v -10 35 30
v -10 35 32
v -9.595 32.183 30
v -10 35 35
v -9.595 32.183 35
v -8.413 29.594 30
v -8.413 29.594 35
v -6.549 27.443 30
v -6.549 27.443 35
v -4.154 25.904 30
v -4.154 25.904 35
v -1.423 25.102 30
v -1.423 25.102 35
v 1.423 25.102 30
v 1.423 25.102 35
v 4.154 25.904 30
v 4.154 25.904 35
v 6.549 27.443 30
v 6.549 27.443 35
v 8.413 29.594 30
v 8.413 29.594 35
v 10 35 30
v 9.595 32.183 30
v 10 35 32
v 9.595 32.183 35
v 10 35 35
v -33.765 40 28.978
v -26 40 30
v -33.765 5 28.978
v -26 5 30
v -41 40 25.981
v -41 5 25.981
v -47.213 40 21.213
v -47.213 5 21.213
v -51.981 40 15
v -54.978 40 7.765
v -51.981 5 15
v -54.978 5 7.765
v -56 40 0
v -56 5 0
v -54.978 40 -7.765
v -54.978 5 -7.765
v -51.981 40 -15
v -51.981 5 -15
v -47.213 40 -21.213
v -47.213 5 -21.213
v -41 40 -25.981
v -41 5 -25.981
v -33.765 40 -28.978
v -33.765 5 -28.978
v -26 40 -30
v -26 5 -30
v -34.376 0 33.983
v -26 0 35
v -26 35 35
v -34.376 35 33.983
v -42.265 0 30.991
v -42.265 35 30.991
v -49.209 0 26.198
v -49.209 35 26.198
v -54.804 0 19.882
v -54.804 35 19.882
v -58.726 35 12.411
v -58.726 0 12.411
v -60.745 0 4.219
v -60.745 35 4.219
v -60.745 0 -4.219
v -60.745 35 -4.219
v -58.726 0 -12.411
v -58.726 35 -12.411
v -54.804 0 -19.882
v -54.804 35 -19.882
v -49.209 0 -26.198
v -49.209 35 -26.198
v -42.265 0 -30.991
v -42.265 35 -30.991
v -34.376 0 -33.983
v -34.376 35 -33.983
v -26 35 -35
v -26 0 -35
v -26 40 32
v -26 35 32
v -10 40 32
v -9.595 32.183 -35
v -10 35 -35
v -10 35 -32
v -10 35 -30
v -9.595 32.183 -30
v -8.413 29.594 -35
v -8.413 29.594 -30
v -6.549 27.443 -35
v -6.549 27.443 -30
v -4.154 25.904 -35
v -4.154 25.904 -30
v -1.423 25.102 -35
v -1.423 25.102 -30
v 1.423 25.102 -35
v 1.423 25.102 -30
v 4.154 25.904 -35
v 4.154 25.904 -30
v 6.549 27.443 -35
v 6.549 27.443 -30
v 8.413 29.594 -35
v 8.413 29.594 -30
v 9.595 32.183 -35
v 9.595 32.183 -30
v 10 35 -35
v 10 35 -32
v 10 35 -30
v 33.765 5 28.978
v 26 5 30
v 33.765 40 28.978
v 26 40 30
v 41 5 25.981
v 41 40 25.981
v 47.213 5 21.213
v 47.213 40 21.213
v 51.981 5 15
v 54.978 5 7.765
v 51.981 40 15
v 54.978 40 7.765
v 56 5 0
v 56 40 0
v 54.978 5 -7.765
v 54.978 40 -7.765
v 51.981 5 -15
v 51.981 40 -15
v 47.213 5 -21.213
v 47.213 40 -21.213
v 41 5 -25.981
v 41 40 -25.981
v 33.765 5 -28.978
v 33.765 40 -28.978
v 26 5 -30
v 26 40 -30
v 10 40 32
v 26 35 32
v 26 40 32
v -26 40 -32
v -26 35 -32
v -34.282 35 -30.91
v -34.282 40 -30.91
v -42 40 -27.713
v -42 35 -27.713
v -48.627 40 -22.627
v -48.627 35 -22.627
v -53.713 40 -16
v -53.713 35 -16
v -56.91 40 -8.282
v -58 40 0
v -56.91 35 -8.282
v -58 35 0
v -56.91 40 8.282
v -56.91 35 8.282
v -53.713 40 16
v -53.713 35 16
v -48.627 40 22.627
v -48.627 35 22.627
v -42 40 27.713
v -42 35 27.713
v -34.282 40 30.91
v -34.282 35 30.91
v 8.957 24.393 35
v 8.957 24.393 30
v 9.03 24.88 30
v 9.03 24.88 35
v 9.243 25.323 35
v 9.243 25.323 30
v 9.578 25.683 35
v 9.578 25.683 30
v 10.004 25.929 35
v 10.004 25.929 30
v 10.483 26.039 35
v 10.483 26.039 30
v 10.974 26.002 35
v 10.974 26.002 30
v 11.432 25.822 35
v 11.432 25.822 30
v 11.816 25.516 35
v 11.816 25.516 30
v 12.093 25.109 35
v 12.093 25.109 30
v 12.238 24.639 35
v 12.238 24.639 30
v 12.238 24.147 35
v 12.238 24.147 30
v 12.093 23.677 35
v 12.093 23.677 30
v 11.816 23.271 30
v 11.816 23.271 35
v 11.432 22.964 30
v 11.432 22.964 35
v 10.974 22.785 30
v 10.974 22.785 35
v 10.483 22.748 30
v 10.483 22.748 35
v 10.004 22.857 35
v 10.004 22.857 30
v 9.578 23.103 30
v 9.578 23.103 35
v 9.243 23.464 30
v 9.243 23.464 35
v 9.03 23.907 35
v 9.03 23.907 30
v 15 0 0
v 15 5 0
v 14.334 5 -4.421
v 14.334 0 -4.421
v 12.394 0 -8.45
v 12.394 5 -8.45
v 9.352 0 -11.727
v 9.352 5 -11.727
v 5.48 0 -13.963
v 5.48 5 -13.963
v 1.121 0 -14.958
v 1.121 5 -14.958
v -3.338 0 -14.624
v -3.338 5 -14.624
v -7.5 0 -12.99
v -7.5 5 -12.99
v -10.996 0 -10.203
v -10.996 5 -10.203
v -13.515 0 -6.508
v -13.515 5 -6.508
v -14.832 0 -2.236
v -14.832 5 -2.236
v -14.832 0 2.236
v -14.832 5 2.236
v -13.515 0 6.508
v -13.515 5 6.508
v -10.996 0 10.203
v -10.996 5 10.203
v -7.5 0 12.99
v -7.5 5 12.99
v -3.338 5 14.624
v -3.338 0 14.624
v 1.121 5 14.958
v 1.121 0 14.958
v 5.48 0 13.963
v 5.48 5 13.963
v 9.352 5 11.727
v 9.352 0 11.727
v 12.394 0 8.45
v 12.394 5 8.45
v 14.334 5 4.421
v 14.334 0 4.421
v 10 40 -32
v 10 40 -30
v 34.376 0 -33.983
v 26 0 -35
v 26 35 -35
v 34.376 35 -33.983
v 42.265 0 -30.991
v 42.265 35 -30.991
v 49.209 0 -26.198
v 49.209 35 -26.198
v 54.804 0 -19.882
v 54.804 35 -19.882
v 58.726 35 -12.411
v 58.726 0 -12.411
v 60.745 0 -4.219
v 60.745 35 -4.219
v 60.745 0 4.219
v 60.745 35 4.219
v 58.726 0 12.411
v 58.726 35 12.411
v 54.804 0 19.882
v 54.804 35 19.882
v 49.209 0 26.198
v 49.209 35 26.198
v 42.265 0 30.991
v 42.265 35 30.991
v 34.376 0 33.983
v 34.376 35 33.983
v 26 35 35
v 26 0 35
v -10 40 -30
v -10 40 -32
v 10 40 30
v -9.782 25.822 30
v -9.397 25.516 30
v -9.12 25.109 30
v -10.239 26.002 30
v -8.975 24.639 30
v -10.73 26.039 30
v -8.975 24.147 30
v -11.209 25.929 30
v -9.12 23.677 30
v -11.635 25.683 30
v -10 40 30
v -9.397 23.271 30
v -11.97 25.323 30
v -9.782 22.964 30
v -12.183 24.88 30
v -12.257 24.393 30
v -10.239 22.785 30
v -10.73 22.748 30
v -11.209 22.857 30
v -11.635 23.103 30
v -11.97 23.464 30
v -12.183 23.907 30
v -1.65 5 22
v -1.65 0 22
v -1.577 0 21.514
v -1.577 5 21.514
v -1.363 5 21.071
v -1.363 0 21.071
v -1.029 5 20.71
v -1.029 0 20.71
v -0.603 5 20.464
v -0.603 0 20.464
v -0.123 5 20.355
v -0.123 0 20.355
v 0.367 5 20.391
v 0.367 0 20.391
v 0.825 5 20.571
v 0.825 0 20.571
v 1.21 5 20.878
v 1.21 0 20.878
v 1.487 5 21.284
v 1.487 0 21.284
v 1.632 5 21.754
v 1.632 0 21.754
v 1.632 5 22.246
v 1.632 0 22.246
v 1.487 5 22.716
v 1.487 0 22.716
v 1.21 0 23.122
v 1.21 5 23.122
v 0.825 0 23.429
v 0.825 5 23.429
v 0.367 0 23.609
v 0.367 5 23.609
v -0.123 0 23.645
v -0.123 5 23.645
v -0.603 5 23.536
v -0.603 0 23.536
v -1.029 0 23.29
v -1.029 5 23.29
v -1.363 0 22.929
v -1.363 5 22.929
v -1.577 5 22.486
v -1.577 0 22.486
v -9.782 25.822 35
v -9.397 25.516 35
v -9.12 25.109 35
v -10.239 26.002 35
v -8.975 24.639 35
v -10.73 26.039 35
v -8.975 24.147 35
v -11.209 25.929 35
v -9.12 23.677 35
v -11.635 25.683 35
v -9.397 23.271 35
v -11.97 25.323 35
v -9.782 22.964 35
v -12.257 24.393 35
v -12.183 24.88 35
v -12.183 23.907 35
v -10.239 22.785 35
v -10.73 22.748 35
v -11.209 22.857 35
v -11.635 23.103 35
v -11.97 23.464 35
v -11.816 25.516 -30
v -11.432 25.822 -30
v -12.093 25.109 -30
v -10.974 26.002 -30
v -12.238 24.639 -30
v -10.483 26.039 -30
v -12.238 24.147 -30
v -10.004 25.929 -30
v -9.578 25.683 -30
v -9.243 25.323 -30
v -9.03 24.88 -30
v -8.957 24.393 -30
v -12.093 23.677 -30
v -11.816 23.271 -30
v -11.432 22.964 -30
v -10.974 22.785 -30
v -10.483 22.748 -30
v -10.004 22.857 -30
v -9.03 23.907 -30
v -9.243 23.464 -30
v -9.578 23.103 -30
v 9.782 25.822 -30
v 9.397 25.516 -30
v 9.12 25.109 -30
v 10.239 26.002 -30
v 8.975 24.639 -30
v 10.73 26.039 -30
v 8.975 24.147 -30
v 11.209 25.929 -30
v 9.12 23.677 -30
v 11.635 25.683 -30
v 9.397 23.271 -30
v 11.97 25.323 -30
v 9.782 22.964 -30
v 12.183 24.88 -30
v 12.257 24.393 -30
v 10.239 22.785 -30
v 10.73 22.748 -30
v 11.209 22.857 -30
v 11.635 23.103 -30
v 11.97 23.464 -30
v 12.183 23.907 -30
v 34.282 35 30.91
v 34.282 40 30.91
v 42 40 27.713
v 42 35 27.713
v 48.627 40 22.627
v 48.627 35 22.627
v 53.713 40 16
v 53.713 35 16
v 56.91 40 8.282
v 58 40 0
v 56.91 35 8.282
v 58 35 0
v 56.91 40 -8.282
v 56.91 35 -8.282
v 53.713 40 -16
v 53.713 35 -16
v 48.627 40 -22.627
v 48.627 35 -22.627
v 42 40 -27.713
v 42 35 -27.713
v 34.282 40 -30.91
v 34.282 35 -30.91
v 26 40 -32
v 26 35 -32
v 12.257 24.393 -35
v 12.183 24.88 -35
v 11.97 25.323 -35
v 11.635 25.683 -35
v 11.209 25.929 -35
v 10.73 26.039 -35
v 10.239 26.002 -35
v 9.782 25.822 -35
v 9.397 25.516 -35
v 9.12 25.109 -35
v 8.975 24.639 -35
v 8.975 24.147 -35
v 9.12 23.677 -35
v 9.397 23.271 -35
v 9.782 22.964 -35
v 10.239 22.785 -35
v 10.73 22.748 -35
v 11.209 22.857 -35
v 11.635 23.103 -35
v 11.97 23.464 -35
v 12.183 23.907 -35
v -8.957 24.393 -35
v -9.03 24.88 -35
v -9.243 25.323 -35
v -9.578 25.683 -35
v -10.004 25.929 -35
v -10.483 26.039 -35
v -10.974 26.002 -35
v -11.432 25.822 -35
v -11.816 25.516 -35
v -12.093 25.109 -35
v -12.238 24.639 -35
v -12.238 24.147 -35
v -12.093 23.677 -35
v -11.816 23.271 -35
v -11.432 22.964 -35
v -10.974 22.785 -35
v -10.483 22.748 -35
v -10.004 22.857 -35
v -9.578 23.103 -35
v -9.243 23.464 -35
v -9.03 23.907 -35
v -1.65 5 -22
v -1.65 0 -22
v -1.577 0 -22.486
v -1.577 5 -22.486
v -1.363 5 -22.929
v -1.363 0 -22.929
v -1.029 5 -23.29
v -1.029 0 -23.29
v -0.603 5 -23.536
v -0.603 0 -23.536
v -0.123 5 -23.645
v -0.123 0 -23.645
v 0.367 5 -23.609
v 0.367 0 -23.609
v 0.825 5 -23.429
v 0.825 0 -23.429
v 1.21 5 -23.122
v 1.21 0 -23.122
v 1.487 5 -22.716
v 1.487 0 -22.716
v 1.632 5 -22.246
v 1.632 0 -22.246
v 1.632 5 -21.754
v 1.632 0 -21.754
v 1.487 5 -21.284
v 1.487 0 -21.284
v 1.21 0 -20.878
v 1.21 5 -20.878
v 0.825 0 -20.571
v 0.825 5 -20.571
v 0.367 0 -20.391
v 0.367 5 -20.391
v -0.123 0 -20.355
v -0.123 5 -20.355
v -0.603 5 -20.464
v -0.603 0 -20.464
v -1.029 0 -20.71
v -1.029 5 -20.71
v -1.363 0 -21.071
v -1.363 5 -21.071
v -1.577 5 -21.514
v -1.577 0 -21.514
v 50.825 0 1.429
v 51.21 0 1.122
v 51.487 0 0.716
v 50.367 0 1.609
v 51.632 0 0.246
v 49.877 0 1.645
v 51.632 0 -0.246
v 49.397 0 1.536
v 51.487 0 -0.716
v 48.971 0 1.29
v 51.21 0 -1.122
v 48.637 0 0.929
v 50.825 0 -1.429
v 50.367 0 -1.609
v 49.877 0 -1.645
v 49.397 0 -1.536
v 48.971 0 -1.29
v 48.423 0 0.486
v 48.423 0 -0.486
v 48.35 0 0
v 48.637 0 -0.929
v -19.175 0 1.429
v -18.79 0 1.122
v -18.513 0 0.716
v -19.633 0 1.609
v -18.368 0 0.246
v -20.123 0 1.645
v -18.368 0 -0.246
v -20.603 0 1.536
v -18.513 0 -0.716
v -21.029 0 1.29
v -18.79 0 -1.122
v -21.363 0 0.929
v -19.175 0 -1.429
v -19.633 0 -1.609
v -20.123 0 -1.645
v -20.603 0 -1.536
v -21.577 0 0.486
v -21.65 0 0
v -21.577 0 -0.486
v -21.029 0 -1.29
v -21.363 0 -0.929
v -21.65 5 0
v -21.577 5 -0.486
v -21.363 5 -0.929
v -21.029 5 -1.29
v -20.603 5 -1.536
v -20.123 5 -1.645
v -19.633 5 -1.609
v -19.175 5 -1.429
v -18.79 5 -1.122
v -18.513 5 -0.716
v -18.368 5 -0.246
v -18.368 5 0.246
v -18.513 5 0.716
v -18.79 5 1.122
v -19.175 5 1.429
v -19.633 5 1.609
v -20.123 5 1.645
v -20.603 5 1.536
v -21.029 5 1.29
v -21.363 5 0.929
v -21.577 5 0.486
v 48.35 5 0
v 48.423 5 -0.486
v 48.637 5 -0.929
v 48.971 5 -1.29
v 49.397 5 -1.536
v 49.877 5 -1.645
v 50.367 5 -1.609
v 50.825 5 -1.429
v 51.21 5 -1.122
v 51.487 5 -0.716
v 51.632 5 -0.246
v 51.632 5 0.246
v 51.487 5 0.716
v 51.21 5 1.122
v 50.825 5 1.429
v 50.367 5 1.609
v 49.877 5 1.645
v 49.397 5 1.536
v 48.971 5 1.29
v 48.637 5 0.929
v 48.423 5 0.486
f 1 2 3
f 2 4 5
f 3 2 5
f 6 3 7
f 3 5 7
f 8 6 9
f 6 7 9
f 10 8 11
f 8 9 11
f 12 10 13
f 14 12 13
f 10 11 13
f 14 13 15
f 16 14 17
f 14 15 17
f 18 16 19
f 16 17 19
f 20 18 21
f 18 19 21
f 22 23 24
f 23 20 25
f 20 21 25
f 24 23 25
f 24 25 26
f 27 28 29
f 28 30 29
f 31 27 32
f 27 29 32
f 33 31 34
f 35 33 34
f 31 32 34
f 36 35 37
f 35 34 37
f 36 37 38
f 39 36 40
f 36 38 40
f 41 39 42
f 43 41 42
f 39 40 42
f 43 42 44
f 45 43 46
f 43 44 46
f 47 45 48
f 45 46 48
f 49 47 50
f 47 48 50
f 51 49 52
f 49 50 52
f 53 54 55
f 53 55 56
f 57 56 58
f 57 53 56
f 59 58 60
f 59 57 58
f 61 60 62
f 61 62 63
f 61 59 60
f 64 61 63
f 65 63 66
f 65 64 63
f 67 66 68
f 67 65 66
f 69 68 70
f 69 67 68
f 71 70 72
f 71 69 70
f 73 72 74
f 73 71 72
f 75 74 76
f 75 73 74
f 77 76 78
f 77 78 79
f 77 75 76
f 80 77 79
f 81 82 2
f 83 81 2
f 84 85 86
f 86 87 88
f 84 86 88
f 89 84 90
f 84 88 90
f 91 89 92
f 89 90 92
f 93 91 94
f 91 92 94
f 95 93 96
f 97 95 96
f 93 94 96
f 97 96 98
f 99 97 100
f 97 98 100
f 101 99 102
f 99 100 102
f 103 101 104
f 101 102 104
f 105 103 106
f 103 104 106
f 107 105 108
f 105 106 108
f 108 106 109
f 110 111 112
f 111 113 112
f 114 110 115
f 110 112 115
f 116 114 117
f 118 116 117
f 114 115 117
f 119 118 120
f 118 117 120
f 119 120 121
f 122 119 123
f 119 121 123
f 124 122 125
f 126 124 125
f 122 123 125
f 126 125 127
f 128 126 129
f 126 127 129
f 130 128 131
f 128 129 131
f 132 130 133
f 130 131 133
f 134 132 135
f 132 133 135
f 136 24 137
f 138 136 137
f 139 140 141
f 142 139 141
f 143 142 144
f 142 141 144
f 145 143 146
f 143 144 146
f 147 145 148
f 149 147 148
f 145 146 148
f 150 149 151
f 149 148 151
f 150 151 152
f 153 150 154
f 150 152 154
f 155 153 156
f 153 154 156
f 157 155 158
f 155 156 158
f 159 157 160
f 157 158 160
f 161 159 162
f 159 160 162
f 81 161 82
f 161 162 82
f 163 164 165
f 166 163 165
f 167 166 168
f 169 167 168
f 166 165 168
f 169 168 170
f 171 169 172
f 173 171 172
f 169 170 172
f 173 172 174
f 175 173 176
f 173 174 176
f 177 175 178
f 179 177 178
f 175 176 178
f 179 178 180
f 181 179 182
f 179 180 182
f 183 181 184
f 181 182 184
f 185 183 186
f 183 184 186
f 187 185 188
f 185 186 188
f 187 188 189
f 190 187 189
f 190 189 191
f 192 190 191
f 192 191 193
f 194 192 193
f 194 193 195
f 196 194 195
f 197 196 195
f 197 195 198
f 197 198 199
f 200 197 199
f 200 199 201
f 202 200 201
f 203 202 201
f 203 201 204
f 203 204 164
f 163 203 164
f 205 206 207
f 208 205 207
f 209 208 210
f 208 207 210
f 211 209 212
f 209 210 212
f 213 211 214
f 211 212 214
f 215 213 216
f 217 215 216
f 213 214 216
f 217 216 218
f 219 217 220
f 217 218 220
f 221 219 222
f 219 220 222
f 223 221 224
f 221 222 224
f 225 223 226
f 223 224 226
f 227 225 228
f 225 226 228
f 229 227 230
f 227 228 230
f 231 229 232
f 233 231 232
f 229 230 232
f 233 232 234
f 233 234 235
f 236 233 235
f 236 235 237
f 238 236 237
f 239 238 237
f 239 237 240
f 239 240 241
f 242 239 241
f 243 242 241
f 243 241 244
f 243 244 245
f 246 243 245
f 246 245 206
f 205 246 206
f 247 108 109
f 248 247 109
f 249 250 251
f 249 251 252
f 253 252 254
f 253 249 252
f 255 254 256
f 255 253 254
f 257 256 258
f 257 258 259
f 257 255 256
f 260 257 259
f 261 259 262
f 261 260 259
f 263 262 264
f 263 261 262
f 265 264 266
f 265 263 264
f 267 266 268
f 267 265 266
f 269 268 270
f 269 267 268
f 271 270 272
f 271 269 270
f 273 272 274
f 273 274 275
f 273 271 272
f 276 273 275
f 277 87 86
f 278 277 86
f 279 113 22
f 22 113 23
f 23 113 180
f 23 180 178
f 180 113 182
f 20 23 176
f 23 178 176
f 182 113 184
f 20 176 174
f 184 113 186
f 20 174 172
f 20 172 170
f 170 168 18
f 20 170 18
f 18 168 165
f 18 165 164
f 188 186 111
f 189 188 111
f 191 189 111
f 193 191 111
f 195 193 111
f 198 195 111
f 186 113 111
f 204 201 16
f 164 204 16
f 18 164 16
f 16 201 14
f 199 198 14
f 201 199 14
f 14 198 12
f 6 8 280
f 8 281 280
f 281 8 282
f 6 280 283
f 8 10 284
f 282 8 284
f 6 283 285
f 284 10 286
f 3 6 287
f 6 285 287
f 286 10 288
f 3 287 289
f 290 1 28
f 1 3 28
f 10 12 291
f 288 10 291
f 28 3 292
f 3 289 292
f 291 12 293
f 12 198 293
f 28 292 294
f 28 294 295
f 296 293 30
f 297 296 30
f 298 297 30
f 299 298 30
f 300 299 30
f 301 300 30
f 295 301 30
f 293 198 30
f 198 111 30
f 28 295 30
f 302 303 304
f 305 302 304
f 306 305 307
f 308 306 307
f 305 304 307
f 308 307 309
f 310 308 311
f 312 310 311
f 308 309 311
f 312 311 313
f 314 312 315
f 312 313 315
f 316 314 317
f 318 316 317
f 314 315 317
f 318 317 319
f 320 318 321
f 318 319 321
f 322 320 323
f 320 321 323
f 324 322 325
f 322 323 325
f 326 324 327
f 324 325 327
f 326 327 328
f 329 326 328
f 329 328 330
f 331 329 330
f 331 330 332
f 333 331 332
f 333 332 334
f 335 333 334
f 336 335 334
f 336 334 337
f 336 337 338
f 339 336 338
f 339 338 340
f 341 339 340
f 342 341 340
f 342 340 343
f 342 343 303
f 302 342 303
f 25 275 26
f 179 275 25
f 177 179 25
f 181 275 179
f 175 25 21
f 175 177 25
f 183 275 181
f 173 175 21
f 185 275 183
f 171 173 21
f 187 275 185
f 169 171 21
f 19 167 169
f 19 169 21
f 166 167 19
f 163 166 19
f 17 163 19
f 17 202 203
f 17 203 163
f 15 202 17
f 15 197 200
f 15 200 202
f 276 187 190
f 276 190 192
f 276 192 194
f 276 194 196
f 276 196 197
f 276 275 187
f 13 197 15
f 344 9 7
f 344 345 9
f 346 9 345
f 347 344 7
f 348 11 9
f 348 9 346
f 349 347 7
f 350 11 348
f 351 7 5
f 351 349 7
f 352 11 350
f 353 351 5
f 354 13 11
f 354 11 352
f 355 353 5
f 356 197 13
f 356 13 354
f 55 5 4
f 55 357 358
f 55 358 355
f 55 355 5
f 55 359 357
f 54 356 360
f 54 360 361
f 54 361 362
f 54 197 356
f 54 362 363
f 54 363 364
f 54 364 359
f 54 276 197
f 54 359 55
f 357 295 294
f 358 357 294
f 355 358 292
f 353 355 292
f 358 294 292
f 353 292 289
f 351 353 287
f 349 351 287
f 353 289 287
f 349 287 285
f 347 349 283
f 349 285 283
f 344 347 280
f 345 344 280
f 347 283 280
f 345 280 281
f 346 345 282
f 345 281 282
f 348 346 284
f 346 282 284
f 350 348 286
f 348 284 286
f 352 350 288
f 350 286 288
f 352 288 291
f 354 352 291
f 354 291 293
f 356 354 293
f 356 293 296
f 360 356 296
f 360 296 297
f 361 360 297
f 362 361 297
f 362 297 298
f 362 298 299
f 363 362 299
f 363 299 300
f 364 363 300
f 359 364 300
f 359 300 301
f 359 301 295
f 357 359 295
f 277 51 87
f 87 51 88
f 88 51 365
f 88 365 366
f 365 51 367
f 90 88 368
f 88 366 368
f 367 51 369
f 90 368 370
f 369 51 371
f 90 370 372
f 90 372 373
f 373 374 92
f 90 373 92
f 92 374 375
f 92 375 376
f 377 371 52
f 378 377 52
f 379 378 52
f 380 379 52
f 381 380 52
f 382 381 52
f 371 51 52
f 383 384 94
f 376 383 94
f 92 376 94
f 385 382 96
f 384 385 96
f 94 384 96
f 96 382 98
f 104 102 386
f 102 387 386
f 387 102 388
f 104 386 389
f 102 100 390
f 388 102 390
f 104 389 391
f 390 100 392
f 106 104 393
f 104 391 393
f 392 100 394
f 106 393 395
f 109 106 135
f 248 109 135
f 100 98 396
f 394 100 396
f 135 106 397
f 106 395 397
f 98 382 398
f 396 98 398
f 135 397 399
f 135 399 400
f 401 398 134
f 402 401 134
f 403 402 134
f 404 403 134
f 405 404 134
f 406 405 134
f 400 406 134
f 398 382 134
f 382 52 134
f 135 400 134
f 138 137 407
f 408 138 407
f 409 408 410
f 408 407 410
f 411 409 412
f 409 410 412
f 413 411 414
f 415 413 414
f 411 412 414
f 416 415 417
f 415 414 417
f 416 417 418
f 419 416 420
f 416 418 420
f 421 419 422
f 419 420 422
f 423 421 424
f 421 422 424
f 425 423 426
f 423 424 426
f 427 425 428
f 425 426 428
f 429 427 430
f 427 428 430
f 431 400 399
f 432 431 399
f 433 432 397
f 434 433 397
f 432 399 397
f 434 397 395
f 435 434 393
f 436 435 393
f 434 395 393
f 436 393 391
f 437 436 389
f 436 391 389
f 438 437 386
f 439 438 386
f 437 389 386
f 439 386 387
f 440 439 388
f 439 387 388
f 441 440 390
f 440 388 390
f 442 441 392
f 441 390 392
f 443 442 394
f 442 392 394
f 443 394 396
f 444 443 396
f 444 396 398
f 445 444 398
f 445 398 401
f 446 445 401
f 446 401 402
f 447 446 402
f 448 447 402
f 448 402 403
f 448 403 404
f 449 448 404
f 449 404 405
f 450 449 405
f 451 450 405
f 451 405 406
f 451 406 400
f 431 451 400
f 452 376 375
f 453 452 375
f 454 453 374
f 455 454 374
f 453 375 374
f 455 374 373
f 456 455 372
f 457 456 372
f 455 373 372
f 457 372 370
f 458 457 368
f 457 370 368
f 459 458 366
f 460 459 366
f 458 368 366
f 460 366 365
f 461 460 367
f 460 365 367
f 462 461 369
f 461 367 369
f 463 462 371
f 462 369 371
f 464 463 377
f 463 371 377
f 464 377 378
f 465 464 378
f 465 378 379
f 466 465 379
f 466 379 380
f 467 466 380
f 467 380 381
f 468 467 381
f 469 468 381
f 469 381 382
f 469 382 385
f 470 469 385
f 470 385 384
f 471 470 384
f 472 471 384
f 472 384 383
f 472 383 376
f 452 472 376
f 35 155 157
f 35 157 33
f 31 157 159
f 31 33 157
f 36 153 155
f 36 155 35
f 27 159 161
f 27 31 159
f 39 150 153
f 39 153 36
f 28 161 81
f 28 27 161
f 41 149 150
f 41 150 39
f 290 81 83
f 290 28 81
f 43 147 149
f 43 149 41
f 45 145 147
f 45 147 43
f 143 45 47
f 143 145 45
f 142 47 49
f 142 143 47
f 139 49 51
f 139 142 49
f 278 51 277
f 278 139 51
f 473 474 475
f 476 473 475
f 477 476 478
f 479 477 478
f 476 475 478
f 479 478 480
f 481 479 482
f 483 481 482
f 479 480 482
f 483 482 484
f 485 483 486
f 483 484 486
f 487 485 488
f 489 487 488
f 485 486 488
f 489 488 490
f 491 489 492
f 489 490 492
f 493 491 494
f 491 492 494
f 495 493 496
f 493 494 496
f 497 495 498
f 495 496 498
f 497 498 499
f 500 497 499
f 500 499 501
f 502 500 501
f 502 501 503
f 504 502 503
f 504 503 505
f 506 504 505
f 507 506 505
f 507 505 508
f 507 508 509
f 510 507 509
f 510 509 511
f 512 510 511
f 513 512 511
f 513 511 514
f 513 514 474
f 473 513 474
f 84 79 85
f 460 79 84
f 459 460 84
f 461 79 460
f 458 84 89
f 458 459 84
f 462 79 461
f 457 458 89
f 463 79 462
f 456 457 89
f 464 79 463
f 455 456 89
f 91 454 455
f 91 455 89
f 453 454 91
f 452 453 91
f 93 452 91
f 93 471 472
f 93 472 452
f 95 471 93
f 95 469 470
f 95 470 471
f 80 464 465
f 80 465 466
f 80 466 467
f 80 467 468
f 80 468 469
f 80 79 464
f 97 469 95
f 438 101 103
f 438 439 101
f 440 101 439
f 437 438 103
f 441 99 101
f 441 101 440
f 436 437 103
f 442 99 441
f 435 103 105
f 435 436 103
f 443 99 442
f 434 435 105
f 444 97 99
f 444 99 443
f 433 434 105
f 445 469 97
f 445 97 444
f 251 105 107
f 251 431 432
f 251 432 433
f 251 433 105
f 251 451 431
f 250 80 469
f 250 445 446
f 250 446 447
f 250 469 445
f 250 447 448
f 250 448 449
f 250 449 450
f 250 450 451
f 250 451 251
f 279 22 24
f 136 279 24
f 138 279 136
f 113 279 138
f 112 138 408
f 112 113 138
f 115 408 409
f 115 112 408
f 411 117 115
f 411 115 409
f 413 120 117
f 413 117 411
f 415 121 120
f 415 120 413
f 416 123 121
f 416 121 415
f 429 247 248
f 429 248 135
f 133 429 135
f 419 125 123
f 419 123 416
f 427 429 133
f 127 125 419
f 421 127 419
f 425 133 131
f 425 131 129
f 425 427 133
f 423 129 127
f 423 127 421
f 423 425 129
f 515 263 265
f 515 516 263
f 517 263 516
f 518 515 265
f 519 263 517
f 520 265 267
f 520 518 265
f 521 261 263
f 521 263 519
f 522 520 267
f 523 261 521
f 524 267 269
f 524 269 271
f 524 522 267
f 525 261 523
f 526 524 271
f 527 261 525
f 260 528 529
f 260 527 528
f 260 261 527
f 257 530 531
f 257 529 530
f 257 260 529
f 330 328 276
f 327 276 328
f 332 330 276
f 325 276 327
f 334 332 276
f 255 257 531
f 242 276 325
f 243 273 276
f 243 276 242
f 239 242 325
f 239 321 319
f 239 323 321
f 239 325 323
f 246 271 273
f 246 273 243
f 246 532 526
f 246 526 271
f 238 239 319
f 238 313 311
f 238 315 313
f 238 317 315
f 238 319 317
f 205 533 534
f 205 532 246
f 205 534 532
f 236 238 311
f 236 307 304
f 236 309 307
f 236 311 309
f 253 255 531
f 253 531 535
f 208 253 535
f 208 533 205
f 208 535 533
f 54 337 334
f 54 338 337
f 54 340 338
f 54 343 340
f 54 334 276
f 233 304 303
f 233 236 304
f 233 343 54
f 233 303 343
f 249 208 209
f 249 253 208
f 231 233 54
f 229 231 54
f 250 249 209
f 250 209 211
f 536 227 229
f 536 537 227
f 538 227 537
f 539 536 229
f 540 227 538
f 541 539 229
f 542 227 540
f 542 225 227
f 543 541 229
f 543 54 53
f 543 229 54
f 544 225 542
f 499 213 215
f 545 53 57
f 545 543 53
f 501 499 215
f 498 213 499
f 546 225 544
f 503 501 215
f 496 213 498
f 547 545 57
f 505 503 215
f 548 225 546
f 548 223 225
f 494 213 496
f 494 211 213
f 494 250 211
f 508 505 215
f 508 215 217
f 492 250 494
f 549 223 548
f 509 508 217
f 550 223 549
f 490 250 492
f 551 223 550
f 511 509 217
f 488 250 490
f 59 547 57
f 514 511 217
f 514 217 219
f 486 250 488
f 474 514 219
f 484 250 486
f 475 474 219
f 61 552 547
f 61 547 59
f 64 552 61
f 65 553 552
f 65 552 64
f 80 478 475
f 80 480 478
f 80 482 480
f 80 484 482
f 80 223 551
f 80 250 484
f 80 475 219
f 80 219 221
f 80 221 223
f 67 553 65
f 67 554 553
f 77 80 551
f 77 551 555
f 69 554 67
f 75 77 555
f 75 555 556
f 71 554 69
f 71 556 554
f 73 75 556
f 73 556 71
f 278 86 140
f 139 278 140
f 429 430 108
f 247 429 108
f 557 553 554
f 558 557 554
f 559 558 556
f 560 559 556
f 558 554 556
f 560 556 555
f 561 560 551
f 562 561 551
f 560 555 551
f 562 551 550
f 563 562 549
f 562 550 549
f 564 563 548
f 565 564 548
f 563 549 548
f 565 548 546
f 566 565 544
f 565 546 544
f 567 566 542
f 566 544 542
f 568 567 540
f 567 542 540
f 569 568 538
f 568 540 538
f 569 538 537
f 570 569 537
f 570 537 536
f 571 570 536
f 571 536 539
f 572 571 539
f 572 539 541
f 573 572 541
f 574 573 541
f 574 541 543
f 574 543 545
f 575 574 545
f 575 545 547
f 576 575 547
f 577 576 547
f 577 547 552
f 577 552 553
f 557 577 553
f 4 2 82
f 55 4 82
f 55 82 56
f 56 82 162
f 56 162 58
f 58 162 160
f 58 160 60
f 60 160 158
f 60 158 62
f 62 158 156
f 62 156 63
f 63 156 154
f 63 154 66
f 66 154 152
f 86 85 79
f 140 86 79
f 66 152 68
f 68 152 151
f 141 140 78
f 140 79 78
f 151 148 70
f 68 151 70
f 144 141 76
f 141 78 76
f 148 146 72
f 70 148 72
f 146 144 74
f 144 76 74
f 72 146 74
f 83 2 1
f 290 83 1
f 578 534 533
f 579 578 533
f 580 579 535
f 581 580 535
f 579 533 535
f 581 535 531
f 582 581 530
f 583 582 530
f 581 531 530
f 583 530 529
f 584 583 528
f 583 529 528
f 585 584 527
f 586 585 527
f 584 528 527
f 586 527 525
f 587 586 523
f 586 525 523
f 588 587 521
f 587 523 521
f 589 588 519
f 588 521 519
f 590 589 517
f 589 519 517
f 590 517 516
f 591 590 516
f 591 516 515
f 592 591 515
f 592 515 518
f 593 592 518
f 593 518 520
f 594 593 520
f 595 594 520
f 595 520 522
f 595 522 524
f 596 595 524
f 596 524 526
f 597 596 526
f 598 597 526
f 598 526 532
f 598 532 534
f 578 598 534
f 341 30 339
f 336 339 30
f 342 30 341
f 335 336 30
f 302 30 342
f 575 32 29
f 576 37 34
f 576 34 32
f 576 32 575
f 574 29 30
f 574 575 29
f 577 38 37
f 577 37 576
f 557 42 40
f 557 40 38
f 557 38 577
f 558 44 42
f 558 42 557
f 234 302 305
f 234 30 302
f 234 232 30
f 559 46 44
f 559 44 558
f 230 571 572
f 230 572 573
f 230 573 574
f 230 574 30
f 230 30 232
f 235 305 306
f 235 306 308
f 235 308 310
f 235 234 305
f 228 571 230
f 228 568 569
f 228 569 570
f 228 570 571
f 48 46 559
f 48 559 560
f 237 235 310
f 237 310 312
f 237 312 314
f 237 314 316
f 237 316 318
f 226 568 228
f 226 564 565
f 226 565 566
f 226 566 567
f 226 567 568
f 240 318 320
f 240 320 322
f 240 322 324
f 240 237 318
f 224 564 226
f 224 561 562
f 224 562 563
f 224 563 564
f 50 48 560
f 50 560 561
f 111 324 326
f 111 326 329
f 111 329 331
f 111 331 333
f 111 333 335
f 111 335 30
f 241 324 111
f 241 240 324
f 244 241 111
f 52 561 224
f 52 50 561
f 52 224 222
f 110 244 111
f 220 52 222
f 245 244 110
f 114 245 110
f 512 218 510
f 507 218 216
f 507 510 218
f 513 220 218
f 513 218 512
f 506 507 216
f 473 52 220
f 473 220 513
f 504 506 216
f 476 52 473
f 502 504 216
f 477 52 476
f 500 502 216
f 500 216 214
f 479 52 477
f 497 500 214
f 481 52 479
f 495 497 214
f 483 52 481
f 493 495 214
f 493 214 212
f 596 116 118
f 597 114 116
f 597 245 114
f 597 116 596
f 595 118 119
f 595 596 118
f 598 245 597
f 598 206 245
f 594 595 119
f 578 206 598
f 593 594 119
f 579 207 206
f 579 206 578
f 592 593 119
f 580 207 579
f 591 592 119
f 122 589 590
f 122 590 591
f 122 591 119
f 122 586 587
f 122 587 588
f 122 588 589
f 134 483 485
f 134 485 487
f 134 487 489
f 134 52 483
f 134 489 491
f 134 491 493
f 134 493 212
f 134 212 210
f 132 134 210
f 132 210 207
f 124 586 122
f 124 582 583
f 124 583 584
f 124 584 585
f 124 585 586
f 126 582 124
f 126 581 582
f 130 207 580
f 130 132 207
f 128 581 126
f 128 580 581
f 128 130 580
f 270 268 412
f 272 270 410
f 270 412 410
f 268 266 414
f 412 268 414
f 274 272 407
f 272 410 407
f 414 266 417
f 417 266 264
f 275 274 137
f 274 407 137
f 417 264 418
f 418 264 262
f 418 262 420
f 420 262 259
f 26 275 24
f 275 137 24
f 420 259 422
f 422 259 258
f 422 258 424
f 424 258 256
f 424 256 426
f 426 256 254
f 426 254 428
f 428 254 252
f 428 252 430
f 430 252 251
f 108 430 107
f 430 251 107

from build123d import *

# Parameters (mm, degrees)
EXTRUDE_1_DEPTH          = 35
CUT_EXTRUDE_1_DEPTH      = 30
SKETCH_3_R               = 10
CUT_EXTRUDE_2_DEPTH      = 1
CUT_EXTRUDE_2_DEPTH_BACK = 71
CUT_EXTRUDE_3_REACH      = 7
SKETCH_4_R               = 15
EXTRUDE_2_DEPTH          = 5
HOLE_WIZARD_M4_1_D       = 3.3
HOLE_WIZARD_M4_1_DEPTH   = 5
HOLE_WIZARD_M4_2_D       = 3.3
HOLE_WIZARD_M4_2_DEPTH   = 5
HOLE_WIZARD_M4_3_D       = 3.3


with BuildPart() as part:
    # 스케치1 → 보스-돌출1 (new body)
    with BuildSketch(Plane(origin=(0, 0, 0), x_dir=(1, 0, 0), z_dir=(0, 1, 0))):
        with BuildLine():
            Line((-26, 35), (26, 35))
            ThreePointArc((26, 35), (61, 0), (26, -35))
            Line((26, -35), (-26, -35))
            ThreePointArc((-26, -35), (-61, 0), (-26, 35))
        make_face()
    extrude(amount=EXTRUDE_1_DEPTH)

    # 스케치2 → 컷-돌출1 (cut)
    with BuildSketch(Plane(origin=(0, 35, 0), x_dir=(1, 0, 0), z_dir=(0, 1, 0))):
        with BuildLine():
            Line((26, 30), (-26, 30))
            ThreePointArc((-26, 30), (-56, 0), (-26, -30))
            Line((-26, -30), (26, -30))
            ThreePointArc((26, -30), (56, 0), (26, 30))
        make_face()
    extrude(amount=-CUT_EXTRUDE_1_DEPTH, mode=Mode.SUBTRACT)

    # 스케치3 → 컷-돌출2 (cut, two sides)
    with BuildSketch(Plane.XY.offset(35)) as cut_extrude_2_sk:
        with Locations((0, 35)):
            Circle(SKETCH_3_R)
    extrude(amount=CUT_EXTRUDE_2_DEPTH, mode=Mode.SUBTRACT)
    extrude(cut_extrude_2_sk.sketch, amount=-CUT_EXTRUDE_2_DEPTH_BACK, mode=Mode.SUBTRACT)

    # 스케치4 → 컷-돌출3 (cut, up to next)
    with BuildSketch(Plane(origin=(0, 5, 0), x_dir=(1, 0, 0), z_dir=(0, 1, 0)), mode=Mode.PRIVATE) as cut_extrude_3_sk1:
        Circle(SKETCH_4_R)
    cut_extrude_3_tool1 = extrude(cut_extrude_3_sk1.sketch, amount=-CUT_EXTRUDE_3_REACH, mode=Mode.PRIVATE) & part.part
    add(cut_extrude_3_tool1.solids().sort_by_distance((0, 5, 0))[0], mode=Mode.SUBTRACT)

    # 스케치5 → 보스-돌출2 (add)
    with BuildSketch(Plane(origin=(0, 35, 0), x_dir=(1, 0, 0), z_dir=(0, 1, 0))):
        with BuildLine():
            Line((-10, 32), (-26, 32))
            ThreePointArc((-26, 32), (-58, 0), (-26, -32))
            Line((-26, -32), (-10, -32))
            Line((-10, -32), (-10, -30))
            Line((-10, -30), (-26, -30))
            ThreePointArc((-26, -30), (-56, 0), (-26, 30))
            Line((-26, 30), (-10, 30))
            Line((-10, 30), (-10, 32))
        make_face()
        with BuildLine():
            Line((10, -32), (26, -32))
            ThreePointArc((26, -32), (58, 0), (26, 32))
            Line((26, 32), (10, 32))
            Line((10, 32), (10, 30))
            Line((10, 30), (26, 30))
            ThreePointArc((26, 30), (56, 0), (26, -30))
            Line((26, -30), (10, -30))
            Line((10, -30), (10, -32))
        make_face()
    extrude(amount=EXTRUDE_2_DEPTH)

    # M4 나사 구멍1
    with Locations(Plane.XY.offset(35)):
        with Locations((-10.606601718, 24.393398282), (10.606601718, 24.393398282)):
            Hole(HOLE_WIZARD_M4_1_D / 2, depth=HOLE_WIZARD_M4_1_DEPTH)

    # M4 나사 구멍2
    with Locations(Plane(origin=(0, 0, -35), x_dir=(-1, 0, 0), z_dir=(0, 0, -1))):
        with Locations((-10.606601718, 24.393398282), (10.606601718, 24.393398282)):
            Hole(HOLE_WIZARD_M4_2_D / 2, depth=HOLE_WIZARD_M4_2_DEPTH)

    # M4 나사 구멍3 (through all)
    with Locations(Plane(origin=(0, 5, 0), x_dir=(1, 0, 0), z_dir=(0, 1, 0))):
        with Locations((0, 22), (-20, 0), (50, 0), (0, -22)):
            Hole(HOLE_WIZARD_M4_3_D / 2)


solid = part.part
